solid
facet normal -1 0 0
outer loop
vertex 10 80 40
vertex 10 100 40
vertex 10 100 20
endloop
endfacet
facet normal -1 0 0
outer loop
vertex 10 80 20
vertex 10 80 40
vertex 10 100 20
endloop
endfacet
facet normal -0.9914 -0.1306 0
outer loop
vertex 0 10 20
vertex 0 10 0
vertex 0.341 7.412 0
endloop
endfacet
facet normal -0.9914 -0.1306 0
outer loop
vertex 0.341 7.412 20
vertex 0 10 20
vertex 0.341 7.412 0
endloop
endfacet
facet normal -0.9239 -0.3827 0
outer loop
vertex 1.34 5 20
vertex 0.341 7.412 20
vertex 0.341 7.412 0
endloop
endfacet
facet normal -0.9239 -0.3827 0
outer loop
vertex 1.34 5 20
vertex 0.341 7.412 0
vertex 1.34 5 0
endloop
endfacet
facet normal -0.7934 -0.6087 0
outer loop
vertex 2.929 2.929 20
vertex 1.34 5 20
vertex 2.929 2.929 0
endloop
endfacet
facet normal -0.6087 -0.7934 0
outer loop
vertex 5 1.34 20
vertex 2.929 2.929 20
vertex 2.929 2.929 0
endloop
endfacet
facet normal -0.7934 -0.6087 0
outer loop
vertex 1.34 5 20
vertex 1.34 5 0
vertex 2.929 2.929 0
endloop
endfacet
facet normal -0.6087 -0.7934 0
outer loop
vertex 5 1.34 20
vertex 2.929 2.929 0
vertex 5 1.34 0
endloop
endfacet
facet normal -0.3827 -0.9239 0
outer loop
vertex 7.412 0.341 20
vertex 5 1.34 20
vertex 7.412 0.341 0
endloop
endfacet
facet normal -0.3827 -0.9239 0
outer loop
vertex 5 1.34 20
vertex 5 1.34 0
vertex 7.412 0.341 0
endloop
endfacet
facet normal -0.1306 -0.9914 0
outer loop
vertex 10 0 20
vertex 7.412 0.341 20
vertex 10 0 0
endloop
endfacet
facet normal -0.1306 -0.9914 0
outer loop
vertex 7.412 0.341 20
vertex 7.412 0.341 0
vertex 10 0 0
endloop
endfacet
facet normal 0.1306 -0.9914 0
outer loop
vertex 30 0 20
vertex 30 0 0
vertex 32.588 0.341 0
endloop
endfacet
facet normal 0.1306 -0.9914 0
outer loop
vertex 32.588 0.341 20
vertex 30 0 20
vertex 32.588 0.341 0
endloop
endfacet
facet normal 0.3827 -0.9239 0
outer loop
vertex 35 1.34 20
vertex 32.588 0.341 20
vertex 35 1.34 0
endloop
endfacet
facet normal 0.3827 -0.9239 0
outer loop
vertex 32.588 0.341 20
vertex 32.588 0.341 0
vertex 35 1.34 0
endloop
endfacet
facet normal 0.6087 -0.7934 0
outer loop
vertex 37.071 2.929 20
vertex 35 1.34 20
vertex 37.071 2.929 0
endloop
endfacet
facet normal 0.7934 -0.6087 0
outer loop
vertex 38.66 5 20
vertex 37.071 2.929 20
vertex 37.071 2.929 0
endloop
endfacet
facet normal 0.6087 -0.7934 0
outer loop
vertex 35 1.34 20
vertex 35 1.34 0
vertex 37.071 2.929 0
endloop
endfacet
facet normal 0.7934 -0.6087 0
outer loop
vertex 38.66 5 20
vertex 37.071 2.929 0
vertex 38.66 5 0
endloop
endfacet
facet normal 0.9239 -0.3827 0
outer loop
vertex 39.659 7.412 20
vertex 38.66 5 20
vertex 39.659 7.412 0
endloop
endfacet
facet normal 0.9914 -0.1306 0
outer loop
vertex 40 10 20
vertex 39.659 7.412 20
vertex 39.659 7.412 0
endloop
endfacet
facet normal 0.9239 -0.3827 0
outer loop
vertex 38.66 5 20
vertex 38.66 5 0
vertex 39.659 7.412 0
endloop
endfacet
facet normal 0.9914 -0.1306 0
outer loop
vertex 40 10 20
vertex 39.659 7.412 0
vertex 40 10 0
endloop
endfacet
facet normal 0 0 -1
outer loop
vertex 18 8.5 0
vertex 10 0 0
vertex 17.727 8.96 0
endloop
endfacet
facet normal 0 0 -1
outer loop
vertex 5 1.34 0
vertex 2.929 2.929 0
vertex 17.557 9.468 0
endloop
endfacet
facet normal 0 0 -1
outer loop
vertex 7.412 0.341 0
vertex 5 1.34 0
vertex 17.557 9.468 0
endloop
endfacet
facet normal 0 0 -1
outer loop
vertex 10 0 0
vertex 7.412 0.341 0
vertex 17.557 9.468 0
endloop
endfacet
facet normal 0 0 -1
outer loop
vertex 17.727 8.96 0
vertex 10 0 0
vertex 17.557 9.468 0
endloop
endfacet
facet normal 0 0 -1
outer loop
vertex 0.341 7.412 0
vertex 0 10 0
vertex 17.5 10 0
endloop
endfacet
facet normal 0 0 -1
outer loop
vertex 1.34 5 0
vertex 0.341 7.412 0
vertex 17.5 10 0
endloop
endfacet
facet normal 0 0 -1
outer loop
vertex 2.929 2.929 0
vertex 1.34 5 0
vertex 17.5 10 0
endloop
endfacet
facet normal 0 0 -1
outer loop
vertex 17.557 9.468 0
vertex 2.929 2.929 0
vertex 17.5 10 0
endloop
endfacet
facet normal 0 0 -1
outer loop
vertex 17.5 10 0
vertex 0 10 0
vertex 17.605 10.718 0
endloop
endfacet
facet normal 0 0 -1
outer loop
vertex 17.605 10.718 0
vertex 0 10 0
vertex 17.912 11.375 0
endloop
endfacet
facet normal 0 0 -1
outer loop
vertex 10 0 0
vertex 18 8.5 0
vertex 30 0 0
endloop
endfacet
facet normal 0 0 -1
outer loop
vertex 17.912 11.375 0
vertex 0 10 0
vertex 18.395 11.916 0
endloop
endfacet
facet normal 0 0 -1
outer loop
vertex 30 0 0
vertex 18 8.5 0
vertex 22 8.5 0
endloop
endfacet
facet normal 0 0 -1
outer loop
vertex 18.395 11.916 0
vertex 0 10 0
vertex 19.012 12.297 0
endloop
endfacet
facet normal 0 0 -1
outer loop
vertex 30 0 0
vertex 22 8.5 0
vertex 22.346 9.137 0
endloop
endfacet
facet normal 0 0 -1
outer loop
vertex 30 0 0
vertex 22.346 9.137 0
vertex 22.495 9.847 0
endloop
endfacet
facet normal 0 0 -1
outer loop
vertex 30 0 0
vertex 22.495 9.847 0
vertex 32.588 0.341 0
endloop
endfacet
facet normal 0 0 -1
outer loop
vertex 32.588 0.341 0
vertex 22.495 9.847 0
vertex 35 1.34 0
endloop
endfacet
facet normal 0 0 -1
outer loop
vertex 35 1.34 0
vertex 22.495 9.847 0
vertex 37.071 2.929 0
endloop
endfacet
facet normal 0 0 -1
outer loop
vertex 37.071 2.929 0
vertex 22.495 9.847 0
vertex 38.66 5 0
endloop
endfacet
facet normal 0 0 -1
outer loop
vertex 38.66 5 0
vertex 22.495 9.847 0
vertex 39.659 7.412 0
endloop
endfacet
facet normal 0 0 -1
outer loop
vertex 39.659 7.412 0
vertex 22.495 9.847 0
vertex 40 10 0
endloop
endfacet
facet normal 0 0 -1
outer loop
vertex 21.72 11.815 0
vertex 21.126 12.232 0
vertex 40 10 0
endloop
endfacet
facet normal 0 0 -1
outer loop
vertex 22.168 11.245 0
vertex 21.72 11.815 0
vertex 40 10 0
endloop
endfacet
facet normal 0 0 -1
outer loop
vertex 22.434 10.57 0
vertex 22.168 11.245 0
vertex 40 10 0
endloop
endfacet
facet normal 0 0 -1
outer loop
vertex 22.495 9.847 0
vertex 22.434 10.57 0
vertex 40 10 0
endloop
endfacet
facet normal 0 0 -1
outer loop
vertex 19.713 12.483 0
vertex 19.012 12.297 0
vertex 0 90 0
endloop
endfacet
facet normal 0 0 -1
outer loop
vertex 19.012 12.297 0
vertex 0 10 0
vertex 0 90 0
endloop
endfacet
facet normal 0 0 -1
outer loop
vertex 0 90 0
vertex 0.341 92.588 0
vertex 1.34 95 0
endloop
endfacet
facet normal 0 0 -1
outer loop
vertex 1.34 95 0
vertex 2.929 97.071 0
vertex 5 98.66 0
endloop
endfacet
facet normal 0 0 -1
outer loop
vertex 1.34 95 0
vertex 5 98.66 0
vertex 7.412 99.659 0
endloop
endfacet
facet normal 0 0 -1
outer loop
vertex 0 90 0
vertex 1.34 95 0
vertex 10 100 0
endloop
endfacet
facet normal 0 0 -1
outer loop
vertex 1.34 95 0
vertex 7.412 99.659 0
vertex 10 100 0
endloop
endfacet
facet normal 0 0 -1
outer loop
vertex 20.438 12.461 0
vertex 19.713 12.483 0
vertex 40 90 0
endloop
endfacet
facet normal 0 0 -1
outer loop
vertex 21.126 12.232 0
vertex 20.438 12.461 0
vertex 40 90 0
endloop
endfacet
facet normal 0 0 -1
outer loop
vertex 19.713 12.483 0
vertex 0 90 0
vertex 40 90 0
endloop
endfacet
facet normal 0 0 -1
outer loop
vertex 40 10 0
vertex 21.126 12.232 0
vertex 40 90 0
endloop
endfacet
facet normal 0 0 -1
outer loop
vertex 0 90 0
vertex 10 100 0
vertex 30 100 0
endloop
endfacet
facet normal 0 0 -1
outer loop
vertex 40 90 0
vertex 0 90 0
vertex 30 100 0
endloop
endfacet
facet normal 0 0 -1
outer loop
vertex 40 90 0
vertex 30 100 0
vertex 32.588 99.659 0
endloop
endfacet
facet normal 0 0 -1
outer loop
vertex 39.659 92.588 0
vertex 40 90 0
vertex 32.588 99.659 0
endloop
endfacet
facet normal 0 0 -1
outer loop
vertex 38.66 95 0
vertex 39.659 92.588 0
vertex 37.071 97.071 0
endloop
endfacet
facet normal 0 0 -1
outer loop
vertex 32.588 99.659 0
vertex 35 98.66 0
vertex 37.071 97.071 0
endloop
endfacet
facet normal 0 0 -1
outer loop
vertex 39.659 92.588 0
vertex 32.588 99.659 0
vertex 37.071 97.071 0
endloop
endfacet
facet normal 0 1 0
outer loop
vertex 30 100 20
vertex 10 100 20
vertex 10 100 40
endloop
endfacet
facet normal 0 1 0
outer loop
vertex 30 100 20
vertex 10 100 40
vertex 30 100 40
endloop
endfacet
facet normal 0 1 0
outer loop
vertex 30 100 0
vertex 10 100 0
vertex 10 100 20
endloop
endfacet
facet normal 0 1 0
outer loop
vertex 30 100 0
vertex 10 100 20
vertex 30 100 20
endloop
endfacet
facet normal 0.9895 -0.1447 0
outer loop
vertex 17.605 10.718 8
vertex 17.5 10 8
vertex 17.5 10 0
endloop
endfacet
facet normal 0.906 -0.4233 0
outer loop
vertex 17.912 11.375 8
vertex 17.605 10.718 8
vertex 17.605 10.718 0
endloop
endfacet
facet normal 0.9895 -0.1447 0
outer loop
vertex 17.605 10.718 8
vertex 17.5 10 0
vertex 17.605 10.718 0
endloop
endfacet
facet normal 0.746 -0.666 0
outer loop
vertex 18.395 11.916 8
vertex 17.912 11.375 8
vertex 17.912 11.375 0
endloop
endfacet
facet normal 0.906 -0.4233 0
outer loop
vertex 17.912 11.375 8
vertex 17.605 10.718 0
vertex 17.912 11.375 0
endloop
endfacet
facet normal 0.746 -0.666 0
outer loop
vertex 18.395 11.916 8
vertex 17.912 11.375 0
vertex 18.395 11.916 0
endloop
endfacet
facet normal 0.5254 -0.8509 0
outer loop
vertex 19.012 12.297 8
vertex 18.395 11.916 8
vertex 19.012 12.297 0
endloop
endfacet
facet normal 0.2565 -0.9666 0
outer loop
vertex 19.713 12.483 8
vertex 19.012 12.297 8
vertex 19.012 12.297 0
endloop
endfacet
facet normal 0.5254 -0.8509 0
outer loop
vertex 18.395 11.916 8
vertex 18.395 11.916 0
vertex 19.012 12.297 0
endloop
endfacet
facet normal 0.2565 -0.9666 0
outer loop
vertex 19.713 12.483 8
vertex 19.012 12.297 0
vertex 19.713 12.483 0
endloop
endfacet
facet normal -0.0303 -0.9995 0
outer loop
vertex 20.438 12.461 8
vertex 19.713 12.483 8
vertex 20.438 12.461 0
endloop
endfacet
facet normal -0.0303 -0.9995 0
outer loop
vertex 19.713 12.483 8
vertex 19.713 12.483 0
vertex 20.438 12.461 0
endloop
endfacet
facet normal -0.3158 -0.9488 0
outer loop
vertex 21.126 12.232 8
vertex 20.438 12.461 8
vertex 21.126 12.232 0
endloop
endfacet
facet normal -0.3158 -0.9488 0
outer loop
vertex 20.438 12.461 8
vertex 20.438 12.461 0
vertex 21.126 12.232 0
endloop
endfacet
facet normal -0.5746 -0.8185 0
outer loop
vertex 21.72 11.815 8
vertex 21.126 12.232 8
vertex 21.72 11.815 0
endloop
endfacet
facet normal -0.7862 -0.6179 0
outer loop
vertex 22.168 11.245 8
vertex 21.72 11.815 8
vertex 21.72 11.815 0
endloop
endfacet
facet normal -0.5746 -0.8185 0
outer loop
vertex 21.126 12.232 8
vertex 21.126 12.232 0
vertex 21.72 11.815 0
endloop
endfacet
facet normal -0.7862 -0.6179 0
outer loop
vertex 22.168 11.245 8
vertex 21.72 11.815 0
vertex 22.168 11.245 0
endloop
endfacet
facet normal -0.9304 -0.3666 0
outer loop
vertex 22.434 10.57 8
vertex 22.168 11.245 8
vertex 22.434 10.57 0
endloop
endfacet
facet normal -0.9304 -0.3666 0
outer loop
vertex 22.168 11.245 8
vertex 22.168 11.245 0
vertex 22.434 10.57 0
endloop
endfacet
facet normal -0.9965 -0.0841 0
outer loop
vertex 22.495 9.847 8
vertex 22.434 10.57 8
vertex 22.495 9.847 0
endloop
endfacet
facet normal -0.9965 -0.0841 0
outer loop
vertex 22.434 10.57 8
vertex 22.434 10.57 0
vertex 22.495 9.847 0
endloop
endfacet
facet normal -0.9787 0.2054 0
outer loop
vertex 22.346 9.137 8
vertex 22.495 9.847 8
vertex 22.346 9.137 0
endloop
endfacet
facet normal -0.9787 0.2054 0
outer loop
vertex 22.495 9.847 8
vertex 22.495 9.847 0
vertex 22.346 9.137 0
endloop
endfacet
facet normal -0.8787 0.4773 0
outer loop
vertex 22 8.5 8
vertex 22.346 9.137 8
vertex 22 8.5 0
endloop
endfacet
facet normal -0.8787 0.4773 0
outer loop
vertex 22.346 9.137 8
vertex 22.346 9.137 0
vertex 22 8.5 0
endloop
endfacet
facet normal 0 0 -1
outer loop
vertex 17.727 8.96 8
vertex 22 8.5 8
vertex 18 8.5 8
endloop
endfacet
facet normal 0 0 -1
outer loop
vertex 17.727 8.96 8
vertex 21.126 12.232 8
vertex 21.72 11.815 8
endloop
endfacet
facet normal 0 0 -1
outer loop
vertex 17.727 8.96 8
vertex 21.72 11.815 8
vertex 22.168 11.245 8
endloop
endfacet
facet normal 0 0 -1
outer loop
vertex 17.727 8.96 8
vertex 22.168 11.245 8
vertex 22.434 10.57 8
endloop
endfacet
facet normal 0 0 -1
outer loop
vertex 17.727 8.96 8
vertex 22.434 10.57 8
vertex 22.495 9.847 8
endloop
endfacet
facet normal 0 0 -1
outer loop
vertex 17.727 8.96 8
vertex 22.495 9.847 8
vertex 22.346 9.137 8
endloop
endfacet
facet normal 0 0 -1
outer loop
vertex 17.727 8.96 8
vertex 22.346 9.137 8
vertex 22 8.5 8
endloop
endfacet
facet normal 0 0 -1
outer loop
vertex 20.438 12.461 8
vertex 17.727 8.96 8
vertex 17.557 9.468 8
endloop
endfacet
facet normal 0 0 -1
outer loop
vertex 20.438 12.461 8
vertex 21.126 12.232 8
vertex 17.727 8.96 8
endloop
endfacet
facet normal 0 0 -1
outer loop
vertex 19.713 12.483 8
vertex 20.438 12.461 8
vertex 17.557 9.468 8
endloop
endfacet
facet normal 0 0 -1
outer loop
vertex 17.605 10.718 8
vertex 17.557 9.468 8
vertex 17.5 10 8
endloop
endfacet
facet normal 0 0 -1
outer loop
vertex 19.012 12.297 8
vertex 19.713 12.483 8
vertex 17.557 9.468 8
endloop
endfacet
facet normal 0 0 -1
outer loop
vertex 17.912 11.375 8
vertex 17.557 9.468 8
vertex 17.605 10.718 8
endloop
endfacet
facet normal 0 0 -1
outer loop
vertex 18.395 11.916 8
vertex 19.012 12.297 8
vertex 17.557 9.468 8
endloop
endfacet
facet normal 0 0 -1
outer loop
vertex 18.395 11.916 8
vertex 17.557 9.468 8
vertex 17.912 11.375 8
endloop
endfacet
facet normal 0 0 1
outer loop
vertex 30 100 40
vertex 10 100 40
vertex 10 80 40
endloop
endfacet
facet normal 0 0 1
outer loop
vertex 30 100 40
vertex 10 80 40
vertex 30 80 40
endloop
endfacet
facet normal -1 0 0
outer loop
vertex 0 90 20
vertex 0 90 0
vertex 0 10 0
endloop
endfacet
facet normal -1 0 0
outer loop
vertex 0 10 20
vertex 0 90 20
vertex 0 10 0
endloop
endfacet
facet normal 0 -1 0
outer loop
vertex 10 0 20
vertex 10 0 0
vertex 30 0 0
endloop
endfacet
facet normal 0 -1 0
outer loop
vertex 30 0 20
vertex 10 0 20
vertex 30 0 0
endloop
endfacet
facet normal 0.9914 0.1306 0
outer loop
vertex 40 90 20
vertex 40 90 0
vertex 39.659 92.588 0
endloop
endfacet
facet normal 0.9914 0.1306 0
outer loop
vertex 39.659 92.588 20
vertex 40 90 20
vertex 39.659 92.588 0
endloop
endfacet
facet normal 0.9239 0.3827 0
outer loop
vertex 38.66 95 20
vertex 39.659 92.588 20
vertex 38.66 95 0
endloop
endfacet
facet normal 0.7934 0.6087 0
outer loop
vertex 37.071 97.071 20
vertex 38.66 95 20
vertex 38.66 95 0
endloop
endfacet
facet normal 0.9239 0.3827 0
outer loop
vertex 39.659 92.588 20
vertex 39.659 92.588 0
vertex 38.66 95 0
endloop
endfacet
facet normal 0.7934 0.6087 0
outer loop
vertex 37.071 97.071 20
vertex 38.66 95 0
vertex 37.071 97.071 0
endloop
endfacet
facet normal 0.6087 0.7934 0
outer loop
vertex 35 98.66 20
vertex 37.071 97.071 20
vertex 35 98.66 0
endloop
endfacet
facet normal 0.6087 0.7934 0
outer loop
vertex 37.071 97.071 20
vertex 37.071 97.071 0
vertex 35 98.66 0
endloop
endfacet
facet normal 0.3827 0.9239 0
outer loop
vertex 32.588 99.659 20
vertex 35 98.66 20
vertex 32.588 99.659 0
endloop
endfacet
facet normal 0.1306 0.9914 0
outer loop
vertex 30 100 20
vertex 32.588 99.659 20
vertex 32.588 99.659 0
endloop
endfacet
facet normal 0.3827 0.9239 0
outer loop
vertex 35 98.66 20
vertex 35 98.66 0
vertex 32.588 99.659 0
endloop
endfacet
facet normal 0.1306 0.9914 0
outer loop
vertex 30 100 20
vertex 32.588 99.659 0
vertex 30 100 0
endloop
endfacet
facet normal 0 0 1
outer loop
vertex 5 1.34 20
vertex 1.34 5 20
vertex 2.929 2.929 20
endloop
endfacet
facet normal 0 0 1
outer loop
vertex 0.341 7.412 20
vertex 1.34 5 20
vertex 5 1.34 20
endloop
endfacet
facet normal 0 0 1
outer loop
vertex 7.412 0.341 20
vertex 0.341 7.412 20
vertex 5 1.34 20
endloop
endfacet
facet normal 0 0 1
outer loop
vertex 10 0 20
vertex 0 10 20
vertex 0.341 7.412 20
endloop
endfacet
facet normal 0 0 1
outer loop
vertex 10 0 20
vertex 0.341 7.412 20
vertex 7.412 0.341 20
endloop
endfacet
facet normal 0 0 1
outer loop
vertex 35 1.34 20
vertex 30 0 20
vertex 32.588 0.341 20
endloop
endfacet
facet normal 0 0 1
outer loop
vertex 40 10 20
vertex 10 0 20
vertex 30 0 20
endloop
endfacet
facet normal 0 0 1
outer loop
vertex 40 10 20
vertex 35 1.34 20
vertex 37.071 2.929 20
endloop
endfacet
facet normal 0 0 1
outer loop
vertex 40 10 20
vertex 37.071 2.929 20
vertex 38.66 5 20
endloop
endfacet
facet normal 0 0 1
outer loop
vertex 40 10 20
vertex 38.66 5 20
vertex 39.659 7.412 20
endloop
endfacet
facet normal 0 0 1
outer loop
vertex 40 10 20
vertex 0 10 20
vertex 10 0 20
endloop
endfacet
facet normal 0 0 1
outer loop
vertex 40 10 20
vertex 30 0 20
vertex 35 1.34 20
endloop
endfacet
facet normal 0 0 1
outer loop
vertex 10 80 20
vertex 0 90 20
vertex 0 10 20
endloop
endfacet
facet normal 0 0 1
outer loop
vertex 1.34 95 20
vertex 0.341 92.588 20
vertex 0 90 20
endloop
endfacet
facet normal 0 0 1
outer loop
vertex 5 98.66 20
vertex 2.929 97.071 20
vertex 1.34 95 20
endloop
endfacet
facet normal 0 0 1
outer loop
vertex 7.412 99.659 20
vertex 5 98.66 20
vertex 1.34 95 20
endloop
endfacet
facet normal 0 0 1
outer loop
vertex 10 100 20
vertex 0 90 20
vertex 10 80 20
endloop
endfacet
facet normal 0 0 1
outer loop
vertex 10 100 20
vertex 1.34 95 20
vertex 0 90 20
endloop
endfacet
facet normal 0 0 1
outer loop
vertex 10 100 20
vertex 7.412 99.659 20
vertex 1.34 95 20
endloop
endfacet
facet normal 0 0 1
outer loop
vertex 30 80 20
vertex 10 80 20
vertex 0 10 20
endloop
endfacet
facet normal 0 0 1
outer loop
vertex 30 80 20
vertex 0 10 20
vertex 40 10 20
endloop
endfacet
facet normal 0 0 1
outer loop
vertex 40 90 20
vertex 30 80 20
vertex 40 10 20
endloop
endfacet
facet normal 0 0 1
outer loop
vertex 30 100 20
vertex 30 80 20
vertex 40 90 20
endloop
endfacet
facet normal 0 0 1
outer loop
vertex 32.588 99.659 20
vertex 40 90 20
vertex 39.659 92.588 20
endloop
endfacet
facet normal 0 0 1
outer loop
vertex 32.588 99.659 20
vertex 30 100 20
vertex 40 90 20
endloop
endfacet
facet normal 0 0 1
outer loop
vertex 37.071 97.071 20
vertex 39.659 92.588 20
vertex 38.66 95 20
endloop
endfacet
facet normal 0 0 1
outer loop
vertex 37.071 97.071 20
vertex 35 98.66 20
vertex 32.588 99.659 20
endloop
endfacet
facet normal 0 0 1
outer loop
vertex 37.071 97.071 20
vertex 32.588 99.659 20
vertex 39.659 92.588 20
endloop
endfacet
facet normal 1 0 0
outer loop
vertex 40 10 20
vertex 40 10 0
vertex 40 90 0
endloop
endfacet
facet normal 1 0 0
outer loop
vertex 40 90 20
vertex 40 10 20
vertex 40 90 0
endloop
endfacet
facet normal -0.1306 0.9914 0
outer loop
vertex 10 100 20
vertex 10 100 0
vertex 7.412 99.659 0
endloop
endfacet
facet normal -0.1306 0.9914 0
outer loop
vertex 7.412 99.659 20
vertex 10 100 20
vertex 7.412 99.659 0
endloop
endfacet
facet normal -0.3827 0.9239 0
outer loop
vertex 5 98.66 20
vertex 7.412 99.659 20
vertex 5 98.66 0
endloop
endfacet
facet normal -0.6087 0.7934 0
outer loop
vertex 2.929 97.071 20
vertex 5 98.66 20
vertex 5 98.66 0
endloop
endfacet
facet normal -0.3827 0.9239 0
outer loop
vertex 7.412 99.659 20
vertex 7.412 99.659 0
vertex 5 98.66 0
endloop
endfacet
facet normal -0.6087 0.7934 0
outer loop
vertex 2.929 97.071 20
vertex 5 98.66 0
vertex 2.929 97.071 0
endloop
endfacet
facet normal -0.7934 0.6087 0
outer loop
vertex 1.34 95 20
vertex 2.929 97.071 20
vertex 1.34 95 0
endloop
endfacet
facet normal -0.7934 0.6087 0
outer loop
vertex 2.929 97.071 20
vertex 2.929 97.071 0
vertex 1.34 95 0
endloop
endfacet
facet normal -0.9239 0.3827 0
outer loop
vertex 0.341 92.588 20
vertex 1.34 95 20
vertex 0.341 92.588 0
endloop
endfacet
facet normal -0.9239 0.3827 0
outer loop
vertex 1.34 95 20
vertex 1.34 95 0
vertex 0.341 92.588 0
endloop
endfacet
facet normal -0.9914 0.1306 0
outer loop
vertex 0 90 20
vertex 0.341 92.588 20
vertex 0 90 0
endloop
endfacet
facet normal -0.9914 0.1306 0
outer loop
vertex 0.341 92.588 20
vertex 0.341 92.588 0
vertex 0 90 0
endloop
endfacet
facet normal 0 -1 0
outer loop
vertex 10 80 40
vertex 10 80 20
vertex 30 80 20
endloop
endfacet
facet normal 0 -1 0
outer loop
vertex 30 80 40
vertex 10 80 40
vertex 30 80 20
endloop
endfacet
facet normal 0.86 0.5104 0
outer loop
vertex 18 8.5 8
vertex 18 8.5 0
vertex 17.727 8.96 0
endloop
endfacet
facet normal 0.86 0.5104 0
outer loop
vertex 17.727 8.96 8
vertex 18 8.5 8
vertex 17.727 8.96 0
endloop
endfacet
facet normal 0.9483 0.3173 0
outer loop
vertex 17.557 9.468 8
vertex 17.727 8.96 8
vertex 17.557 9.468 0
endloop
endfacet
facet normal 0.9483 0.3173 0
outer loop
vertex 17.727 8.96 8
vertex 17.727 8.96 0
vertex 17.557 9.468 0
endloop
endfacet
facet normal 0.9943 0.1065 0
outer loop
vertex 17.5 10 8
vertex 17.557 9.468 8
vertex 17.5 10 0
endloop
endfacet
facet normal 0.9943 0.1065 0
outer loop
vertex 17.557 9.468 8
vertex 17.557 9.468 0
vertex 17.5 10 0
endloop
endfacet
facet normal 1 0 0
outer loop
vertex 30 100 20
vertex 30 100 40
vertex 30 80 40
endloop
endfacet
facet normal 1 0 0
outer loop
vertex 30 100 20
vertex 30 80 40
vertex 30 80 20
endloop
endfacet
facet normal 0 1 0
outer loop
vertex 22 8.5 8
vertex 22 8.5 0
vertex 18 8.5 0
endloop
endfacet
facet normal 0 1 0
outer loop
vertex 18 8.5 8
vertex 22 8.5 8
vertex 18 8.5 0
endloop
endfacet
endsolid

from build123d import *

# Parameters (mm, degrees)
SALIENTE_EXTRUIR1_DEPTH = 20
CORTAR_EXTRUIR1_DEPTH   = 8
CROQUIS3_W              = 20
CROQUIS3_H              = 20
SALIENTE_EXTRUIR2_DEPTH = 20


with BuildPart() as part:
    # Croquis1 → Saliente-Extruir1 (new body)
    with BuildSketch(Plane.XY):
        with BuildLine():
            Line((0, 90), (0, 10))
            Line((0, 10), (17.5, 10))
            ThreePointArc((17.5, 10), (20, 12.5), (22.5, 10))
            Line((22.5, 10), (40, 10))
            Line((40, 10), (40, 90))
            ThreePointArc((40, 90), (37.071067812, 97.071067812), (30, 100))
            Line((30, 100), (10, 100))
            ThreePointArc((10, 100), (2.928932188, 97.071067812), (0, 90))
        make_face()
        with BuildLine():
            Line((17.5, 10), (0, 10))
            ThreePointArc((0, 10), (2.928932188, 2.928932188), (10, 0))
            Line((10, 0), (30, 0))
            ThreePointArc((30, 0), (37.071067812, 2.928932188), (40, 10))
            Line((40, 10), (22.5, 10))
            ThreePointArc((22.5, 10), (22.371708245, 9.209430585), (22, 8.5))
            ThreePointArc((22, 8.5), (20, 7.5), (18, 8.5))
            ThreePointArc((18, 8.5), (17.628291755, 9.209430585), (17.5, 10))
        make_face()
        with BuildLine():
            ThreePointArc((22.5, 10), (20, 12.5), (17.5, 10))
            ThreePointArc((17.5, 10), (17.628291755, 9.209430585), (18, 8.5))
            Line((18, 8.5), (22, 8.5))
            ThreePointArc((22, 8.5), (22.371708245, 9.209430585), (22.5, 10))
        make_face()
        with BuildLine():
            Line((22, 8.5), (18, 8.5))
            ThreePointArc((18, 8.5), (20, 7.5), (22, 8.5))
        make_face()
    extrude(amount=SALIENTE_EXTRUIR1_DEPTH)

    # Croquis2 → Cortar-Extruir1 (cut)
    with BuildSketch(Plane(origin=(0, 0, 0), x_dir=(-1, 0, 0), z_dir=(0, 0, -1))):
        with BuildLine():
            Line((-22, 8.5), (-20, 8.5))
            Line((-20, 8.5), (-18, 8.5))
            ThreePointArc((-18, 8.5), (-17.628291755, 9.209430585), (-17.5, 10))
            ThreePointArc((-17.5, 10), (-20.790569415, 12.371708245), (-22, 8.5))
        make_face()
    extrude(amount=-CORTAR_EXTRUIR1_DEPTH, mode=Mode.SUBTRACT)

    # Croquis3 → Saliente-Extruir2 (add)
    with BuildSketch(Plane(origin=(0, 100, 0), x_dir=(1, 0, 0), z_dir=(0, 1, 0))):
        with Locations((20, -30)):
            Rectangle(CROQUIS3_W, CROQUIS3_H)
    extrude(amount=-SALIENTE_EXTRUIR2_DEPTH)


solid = part.part
